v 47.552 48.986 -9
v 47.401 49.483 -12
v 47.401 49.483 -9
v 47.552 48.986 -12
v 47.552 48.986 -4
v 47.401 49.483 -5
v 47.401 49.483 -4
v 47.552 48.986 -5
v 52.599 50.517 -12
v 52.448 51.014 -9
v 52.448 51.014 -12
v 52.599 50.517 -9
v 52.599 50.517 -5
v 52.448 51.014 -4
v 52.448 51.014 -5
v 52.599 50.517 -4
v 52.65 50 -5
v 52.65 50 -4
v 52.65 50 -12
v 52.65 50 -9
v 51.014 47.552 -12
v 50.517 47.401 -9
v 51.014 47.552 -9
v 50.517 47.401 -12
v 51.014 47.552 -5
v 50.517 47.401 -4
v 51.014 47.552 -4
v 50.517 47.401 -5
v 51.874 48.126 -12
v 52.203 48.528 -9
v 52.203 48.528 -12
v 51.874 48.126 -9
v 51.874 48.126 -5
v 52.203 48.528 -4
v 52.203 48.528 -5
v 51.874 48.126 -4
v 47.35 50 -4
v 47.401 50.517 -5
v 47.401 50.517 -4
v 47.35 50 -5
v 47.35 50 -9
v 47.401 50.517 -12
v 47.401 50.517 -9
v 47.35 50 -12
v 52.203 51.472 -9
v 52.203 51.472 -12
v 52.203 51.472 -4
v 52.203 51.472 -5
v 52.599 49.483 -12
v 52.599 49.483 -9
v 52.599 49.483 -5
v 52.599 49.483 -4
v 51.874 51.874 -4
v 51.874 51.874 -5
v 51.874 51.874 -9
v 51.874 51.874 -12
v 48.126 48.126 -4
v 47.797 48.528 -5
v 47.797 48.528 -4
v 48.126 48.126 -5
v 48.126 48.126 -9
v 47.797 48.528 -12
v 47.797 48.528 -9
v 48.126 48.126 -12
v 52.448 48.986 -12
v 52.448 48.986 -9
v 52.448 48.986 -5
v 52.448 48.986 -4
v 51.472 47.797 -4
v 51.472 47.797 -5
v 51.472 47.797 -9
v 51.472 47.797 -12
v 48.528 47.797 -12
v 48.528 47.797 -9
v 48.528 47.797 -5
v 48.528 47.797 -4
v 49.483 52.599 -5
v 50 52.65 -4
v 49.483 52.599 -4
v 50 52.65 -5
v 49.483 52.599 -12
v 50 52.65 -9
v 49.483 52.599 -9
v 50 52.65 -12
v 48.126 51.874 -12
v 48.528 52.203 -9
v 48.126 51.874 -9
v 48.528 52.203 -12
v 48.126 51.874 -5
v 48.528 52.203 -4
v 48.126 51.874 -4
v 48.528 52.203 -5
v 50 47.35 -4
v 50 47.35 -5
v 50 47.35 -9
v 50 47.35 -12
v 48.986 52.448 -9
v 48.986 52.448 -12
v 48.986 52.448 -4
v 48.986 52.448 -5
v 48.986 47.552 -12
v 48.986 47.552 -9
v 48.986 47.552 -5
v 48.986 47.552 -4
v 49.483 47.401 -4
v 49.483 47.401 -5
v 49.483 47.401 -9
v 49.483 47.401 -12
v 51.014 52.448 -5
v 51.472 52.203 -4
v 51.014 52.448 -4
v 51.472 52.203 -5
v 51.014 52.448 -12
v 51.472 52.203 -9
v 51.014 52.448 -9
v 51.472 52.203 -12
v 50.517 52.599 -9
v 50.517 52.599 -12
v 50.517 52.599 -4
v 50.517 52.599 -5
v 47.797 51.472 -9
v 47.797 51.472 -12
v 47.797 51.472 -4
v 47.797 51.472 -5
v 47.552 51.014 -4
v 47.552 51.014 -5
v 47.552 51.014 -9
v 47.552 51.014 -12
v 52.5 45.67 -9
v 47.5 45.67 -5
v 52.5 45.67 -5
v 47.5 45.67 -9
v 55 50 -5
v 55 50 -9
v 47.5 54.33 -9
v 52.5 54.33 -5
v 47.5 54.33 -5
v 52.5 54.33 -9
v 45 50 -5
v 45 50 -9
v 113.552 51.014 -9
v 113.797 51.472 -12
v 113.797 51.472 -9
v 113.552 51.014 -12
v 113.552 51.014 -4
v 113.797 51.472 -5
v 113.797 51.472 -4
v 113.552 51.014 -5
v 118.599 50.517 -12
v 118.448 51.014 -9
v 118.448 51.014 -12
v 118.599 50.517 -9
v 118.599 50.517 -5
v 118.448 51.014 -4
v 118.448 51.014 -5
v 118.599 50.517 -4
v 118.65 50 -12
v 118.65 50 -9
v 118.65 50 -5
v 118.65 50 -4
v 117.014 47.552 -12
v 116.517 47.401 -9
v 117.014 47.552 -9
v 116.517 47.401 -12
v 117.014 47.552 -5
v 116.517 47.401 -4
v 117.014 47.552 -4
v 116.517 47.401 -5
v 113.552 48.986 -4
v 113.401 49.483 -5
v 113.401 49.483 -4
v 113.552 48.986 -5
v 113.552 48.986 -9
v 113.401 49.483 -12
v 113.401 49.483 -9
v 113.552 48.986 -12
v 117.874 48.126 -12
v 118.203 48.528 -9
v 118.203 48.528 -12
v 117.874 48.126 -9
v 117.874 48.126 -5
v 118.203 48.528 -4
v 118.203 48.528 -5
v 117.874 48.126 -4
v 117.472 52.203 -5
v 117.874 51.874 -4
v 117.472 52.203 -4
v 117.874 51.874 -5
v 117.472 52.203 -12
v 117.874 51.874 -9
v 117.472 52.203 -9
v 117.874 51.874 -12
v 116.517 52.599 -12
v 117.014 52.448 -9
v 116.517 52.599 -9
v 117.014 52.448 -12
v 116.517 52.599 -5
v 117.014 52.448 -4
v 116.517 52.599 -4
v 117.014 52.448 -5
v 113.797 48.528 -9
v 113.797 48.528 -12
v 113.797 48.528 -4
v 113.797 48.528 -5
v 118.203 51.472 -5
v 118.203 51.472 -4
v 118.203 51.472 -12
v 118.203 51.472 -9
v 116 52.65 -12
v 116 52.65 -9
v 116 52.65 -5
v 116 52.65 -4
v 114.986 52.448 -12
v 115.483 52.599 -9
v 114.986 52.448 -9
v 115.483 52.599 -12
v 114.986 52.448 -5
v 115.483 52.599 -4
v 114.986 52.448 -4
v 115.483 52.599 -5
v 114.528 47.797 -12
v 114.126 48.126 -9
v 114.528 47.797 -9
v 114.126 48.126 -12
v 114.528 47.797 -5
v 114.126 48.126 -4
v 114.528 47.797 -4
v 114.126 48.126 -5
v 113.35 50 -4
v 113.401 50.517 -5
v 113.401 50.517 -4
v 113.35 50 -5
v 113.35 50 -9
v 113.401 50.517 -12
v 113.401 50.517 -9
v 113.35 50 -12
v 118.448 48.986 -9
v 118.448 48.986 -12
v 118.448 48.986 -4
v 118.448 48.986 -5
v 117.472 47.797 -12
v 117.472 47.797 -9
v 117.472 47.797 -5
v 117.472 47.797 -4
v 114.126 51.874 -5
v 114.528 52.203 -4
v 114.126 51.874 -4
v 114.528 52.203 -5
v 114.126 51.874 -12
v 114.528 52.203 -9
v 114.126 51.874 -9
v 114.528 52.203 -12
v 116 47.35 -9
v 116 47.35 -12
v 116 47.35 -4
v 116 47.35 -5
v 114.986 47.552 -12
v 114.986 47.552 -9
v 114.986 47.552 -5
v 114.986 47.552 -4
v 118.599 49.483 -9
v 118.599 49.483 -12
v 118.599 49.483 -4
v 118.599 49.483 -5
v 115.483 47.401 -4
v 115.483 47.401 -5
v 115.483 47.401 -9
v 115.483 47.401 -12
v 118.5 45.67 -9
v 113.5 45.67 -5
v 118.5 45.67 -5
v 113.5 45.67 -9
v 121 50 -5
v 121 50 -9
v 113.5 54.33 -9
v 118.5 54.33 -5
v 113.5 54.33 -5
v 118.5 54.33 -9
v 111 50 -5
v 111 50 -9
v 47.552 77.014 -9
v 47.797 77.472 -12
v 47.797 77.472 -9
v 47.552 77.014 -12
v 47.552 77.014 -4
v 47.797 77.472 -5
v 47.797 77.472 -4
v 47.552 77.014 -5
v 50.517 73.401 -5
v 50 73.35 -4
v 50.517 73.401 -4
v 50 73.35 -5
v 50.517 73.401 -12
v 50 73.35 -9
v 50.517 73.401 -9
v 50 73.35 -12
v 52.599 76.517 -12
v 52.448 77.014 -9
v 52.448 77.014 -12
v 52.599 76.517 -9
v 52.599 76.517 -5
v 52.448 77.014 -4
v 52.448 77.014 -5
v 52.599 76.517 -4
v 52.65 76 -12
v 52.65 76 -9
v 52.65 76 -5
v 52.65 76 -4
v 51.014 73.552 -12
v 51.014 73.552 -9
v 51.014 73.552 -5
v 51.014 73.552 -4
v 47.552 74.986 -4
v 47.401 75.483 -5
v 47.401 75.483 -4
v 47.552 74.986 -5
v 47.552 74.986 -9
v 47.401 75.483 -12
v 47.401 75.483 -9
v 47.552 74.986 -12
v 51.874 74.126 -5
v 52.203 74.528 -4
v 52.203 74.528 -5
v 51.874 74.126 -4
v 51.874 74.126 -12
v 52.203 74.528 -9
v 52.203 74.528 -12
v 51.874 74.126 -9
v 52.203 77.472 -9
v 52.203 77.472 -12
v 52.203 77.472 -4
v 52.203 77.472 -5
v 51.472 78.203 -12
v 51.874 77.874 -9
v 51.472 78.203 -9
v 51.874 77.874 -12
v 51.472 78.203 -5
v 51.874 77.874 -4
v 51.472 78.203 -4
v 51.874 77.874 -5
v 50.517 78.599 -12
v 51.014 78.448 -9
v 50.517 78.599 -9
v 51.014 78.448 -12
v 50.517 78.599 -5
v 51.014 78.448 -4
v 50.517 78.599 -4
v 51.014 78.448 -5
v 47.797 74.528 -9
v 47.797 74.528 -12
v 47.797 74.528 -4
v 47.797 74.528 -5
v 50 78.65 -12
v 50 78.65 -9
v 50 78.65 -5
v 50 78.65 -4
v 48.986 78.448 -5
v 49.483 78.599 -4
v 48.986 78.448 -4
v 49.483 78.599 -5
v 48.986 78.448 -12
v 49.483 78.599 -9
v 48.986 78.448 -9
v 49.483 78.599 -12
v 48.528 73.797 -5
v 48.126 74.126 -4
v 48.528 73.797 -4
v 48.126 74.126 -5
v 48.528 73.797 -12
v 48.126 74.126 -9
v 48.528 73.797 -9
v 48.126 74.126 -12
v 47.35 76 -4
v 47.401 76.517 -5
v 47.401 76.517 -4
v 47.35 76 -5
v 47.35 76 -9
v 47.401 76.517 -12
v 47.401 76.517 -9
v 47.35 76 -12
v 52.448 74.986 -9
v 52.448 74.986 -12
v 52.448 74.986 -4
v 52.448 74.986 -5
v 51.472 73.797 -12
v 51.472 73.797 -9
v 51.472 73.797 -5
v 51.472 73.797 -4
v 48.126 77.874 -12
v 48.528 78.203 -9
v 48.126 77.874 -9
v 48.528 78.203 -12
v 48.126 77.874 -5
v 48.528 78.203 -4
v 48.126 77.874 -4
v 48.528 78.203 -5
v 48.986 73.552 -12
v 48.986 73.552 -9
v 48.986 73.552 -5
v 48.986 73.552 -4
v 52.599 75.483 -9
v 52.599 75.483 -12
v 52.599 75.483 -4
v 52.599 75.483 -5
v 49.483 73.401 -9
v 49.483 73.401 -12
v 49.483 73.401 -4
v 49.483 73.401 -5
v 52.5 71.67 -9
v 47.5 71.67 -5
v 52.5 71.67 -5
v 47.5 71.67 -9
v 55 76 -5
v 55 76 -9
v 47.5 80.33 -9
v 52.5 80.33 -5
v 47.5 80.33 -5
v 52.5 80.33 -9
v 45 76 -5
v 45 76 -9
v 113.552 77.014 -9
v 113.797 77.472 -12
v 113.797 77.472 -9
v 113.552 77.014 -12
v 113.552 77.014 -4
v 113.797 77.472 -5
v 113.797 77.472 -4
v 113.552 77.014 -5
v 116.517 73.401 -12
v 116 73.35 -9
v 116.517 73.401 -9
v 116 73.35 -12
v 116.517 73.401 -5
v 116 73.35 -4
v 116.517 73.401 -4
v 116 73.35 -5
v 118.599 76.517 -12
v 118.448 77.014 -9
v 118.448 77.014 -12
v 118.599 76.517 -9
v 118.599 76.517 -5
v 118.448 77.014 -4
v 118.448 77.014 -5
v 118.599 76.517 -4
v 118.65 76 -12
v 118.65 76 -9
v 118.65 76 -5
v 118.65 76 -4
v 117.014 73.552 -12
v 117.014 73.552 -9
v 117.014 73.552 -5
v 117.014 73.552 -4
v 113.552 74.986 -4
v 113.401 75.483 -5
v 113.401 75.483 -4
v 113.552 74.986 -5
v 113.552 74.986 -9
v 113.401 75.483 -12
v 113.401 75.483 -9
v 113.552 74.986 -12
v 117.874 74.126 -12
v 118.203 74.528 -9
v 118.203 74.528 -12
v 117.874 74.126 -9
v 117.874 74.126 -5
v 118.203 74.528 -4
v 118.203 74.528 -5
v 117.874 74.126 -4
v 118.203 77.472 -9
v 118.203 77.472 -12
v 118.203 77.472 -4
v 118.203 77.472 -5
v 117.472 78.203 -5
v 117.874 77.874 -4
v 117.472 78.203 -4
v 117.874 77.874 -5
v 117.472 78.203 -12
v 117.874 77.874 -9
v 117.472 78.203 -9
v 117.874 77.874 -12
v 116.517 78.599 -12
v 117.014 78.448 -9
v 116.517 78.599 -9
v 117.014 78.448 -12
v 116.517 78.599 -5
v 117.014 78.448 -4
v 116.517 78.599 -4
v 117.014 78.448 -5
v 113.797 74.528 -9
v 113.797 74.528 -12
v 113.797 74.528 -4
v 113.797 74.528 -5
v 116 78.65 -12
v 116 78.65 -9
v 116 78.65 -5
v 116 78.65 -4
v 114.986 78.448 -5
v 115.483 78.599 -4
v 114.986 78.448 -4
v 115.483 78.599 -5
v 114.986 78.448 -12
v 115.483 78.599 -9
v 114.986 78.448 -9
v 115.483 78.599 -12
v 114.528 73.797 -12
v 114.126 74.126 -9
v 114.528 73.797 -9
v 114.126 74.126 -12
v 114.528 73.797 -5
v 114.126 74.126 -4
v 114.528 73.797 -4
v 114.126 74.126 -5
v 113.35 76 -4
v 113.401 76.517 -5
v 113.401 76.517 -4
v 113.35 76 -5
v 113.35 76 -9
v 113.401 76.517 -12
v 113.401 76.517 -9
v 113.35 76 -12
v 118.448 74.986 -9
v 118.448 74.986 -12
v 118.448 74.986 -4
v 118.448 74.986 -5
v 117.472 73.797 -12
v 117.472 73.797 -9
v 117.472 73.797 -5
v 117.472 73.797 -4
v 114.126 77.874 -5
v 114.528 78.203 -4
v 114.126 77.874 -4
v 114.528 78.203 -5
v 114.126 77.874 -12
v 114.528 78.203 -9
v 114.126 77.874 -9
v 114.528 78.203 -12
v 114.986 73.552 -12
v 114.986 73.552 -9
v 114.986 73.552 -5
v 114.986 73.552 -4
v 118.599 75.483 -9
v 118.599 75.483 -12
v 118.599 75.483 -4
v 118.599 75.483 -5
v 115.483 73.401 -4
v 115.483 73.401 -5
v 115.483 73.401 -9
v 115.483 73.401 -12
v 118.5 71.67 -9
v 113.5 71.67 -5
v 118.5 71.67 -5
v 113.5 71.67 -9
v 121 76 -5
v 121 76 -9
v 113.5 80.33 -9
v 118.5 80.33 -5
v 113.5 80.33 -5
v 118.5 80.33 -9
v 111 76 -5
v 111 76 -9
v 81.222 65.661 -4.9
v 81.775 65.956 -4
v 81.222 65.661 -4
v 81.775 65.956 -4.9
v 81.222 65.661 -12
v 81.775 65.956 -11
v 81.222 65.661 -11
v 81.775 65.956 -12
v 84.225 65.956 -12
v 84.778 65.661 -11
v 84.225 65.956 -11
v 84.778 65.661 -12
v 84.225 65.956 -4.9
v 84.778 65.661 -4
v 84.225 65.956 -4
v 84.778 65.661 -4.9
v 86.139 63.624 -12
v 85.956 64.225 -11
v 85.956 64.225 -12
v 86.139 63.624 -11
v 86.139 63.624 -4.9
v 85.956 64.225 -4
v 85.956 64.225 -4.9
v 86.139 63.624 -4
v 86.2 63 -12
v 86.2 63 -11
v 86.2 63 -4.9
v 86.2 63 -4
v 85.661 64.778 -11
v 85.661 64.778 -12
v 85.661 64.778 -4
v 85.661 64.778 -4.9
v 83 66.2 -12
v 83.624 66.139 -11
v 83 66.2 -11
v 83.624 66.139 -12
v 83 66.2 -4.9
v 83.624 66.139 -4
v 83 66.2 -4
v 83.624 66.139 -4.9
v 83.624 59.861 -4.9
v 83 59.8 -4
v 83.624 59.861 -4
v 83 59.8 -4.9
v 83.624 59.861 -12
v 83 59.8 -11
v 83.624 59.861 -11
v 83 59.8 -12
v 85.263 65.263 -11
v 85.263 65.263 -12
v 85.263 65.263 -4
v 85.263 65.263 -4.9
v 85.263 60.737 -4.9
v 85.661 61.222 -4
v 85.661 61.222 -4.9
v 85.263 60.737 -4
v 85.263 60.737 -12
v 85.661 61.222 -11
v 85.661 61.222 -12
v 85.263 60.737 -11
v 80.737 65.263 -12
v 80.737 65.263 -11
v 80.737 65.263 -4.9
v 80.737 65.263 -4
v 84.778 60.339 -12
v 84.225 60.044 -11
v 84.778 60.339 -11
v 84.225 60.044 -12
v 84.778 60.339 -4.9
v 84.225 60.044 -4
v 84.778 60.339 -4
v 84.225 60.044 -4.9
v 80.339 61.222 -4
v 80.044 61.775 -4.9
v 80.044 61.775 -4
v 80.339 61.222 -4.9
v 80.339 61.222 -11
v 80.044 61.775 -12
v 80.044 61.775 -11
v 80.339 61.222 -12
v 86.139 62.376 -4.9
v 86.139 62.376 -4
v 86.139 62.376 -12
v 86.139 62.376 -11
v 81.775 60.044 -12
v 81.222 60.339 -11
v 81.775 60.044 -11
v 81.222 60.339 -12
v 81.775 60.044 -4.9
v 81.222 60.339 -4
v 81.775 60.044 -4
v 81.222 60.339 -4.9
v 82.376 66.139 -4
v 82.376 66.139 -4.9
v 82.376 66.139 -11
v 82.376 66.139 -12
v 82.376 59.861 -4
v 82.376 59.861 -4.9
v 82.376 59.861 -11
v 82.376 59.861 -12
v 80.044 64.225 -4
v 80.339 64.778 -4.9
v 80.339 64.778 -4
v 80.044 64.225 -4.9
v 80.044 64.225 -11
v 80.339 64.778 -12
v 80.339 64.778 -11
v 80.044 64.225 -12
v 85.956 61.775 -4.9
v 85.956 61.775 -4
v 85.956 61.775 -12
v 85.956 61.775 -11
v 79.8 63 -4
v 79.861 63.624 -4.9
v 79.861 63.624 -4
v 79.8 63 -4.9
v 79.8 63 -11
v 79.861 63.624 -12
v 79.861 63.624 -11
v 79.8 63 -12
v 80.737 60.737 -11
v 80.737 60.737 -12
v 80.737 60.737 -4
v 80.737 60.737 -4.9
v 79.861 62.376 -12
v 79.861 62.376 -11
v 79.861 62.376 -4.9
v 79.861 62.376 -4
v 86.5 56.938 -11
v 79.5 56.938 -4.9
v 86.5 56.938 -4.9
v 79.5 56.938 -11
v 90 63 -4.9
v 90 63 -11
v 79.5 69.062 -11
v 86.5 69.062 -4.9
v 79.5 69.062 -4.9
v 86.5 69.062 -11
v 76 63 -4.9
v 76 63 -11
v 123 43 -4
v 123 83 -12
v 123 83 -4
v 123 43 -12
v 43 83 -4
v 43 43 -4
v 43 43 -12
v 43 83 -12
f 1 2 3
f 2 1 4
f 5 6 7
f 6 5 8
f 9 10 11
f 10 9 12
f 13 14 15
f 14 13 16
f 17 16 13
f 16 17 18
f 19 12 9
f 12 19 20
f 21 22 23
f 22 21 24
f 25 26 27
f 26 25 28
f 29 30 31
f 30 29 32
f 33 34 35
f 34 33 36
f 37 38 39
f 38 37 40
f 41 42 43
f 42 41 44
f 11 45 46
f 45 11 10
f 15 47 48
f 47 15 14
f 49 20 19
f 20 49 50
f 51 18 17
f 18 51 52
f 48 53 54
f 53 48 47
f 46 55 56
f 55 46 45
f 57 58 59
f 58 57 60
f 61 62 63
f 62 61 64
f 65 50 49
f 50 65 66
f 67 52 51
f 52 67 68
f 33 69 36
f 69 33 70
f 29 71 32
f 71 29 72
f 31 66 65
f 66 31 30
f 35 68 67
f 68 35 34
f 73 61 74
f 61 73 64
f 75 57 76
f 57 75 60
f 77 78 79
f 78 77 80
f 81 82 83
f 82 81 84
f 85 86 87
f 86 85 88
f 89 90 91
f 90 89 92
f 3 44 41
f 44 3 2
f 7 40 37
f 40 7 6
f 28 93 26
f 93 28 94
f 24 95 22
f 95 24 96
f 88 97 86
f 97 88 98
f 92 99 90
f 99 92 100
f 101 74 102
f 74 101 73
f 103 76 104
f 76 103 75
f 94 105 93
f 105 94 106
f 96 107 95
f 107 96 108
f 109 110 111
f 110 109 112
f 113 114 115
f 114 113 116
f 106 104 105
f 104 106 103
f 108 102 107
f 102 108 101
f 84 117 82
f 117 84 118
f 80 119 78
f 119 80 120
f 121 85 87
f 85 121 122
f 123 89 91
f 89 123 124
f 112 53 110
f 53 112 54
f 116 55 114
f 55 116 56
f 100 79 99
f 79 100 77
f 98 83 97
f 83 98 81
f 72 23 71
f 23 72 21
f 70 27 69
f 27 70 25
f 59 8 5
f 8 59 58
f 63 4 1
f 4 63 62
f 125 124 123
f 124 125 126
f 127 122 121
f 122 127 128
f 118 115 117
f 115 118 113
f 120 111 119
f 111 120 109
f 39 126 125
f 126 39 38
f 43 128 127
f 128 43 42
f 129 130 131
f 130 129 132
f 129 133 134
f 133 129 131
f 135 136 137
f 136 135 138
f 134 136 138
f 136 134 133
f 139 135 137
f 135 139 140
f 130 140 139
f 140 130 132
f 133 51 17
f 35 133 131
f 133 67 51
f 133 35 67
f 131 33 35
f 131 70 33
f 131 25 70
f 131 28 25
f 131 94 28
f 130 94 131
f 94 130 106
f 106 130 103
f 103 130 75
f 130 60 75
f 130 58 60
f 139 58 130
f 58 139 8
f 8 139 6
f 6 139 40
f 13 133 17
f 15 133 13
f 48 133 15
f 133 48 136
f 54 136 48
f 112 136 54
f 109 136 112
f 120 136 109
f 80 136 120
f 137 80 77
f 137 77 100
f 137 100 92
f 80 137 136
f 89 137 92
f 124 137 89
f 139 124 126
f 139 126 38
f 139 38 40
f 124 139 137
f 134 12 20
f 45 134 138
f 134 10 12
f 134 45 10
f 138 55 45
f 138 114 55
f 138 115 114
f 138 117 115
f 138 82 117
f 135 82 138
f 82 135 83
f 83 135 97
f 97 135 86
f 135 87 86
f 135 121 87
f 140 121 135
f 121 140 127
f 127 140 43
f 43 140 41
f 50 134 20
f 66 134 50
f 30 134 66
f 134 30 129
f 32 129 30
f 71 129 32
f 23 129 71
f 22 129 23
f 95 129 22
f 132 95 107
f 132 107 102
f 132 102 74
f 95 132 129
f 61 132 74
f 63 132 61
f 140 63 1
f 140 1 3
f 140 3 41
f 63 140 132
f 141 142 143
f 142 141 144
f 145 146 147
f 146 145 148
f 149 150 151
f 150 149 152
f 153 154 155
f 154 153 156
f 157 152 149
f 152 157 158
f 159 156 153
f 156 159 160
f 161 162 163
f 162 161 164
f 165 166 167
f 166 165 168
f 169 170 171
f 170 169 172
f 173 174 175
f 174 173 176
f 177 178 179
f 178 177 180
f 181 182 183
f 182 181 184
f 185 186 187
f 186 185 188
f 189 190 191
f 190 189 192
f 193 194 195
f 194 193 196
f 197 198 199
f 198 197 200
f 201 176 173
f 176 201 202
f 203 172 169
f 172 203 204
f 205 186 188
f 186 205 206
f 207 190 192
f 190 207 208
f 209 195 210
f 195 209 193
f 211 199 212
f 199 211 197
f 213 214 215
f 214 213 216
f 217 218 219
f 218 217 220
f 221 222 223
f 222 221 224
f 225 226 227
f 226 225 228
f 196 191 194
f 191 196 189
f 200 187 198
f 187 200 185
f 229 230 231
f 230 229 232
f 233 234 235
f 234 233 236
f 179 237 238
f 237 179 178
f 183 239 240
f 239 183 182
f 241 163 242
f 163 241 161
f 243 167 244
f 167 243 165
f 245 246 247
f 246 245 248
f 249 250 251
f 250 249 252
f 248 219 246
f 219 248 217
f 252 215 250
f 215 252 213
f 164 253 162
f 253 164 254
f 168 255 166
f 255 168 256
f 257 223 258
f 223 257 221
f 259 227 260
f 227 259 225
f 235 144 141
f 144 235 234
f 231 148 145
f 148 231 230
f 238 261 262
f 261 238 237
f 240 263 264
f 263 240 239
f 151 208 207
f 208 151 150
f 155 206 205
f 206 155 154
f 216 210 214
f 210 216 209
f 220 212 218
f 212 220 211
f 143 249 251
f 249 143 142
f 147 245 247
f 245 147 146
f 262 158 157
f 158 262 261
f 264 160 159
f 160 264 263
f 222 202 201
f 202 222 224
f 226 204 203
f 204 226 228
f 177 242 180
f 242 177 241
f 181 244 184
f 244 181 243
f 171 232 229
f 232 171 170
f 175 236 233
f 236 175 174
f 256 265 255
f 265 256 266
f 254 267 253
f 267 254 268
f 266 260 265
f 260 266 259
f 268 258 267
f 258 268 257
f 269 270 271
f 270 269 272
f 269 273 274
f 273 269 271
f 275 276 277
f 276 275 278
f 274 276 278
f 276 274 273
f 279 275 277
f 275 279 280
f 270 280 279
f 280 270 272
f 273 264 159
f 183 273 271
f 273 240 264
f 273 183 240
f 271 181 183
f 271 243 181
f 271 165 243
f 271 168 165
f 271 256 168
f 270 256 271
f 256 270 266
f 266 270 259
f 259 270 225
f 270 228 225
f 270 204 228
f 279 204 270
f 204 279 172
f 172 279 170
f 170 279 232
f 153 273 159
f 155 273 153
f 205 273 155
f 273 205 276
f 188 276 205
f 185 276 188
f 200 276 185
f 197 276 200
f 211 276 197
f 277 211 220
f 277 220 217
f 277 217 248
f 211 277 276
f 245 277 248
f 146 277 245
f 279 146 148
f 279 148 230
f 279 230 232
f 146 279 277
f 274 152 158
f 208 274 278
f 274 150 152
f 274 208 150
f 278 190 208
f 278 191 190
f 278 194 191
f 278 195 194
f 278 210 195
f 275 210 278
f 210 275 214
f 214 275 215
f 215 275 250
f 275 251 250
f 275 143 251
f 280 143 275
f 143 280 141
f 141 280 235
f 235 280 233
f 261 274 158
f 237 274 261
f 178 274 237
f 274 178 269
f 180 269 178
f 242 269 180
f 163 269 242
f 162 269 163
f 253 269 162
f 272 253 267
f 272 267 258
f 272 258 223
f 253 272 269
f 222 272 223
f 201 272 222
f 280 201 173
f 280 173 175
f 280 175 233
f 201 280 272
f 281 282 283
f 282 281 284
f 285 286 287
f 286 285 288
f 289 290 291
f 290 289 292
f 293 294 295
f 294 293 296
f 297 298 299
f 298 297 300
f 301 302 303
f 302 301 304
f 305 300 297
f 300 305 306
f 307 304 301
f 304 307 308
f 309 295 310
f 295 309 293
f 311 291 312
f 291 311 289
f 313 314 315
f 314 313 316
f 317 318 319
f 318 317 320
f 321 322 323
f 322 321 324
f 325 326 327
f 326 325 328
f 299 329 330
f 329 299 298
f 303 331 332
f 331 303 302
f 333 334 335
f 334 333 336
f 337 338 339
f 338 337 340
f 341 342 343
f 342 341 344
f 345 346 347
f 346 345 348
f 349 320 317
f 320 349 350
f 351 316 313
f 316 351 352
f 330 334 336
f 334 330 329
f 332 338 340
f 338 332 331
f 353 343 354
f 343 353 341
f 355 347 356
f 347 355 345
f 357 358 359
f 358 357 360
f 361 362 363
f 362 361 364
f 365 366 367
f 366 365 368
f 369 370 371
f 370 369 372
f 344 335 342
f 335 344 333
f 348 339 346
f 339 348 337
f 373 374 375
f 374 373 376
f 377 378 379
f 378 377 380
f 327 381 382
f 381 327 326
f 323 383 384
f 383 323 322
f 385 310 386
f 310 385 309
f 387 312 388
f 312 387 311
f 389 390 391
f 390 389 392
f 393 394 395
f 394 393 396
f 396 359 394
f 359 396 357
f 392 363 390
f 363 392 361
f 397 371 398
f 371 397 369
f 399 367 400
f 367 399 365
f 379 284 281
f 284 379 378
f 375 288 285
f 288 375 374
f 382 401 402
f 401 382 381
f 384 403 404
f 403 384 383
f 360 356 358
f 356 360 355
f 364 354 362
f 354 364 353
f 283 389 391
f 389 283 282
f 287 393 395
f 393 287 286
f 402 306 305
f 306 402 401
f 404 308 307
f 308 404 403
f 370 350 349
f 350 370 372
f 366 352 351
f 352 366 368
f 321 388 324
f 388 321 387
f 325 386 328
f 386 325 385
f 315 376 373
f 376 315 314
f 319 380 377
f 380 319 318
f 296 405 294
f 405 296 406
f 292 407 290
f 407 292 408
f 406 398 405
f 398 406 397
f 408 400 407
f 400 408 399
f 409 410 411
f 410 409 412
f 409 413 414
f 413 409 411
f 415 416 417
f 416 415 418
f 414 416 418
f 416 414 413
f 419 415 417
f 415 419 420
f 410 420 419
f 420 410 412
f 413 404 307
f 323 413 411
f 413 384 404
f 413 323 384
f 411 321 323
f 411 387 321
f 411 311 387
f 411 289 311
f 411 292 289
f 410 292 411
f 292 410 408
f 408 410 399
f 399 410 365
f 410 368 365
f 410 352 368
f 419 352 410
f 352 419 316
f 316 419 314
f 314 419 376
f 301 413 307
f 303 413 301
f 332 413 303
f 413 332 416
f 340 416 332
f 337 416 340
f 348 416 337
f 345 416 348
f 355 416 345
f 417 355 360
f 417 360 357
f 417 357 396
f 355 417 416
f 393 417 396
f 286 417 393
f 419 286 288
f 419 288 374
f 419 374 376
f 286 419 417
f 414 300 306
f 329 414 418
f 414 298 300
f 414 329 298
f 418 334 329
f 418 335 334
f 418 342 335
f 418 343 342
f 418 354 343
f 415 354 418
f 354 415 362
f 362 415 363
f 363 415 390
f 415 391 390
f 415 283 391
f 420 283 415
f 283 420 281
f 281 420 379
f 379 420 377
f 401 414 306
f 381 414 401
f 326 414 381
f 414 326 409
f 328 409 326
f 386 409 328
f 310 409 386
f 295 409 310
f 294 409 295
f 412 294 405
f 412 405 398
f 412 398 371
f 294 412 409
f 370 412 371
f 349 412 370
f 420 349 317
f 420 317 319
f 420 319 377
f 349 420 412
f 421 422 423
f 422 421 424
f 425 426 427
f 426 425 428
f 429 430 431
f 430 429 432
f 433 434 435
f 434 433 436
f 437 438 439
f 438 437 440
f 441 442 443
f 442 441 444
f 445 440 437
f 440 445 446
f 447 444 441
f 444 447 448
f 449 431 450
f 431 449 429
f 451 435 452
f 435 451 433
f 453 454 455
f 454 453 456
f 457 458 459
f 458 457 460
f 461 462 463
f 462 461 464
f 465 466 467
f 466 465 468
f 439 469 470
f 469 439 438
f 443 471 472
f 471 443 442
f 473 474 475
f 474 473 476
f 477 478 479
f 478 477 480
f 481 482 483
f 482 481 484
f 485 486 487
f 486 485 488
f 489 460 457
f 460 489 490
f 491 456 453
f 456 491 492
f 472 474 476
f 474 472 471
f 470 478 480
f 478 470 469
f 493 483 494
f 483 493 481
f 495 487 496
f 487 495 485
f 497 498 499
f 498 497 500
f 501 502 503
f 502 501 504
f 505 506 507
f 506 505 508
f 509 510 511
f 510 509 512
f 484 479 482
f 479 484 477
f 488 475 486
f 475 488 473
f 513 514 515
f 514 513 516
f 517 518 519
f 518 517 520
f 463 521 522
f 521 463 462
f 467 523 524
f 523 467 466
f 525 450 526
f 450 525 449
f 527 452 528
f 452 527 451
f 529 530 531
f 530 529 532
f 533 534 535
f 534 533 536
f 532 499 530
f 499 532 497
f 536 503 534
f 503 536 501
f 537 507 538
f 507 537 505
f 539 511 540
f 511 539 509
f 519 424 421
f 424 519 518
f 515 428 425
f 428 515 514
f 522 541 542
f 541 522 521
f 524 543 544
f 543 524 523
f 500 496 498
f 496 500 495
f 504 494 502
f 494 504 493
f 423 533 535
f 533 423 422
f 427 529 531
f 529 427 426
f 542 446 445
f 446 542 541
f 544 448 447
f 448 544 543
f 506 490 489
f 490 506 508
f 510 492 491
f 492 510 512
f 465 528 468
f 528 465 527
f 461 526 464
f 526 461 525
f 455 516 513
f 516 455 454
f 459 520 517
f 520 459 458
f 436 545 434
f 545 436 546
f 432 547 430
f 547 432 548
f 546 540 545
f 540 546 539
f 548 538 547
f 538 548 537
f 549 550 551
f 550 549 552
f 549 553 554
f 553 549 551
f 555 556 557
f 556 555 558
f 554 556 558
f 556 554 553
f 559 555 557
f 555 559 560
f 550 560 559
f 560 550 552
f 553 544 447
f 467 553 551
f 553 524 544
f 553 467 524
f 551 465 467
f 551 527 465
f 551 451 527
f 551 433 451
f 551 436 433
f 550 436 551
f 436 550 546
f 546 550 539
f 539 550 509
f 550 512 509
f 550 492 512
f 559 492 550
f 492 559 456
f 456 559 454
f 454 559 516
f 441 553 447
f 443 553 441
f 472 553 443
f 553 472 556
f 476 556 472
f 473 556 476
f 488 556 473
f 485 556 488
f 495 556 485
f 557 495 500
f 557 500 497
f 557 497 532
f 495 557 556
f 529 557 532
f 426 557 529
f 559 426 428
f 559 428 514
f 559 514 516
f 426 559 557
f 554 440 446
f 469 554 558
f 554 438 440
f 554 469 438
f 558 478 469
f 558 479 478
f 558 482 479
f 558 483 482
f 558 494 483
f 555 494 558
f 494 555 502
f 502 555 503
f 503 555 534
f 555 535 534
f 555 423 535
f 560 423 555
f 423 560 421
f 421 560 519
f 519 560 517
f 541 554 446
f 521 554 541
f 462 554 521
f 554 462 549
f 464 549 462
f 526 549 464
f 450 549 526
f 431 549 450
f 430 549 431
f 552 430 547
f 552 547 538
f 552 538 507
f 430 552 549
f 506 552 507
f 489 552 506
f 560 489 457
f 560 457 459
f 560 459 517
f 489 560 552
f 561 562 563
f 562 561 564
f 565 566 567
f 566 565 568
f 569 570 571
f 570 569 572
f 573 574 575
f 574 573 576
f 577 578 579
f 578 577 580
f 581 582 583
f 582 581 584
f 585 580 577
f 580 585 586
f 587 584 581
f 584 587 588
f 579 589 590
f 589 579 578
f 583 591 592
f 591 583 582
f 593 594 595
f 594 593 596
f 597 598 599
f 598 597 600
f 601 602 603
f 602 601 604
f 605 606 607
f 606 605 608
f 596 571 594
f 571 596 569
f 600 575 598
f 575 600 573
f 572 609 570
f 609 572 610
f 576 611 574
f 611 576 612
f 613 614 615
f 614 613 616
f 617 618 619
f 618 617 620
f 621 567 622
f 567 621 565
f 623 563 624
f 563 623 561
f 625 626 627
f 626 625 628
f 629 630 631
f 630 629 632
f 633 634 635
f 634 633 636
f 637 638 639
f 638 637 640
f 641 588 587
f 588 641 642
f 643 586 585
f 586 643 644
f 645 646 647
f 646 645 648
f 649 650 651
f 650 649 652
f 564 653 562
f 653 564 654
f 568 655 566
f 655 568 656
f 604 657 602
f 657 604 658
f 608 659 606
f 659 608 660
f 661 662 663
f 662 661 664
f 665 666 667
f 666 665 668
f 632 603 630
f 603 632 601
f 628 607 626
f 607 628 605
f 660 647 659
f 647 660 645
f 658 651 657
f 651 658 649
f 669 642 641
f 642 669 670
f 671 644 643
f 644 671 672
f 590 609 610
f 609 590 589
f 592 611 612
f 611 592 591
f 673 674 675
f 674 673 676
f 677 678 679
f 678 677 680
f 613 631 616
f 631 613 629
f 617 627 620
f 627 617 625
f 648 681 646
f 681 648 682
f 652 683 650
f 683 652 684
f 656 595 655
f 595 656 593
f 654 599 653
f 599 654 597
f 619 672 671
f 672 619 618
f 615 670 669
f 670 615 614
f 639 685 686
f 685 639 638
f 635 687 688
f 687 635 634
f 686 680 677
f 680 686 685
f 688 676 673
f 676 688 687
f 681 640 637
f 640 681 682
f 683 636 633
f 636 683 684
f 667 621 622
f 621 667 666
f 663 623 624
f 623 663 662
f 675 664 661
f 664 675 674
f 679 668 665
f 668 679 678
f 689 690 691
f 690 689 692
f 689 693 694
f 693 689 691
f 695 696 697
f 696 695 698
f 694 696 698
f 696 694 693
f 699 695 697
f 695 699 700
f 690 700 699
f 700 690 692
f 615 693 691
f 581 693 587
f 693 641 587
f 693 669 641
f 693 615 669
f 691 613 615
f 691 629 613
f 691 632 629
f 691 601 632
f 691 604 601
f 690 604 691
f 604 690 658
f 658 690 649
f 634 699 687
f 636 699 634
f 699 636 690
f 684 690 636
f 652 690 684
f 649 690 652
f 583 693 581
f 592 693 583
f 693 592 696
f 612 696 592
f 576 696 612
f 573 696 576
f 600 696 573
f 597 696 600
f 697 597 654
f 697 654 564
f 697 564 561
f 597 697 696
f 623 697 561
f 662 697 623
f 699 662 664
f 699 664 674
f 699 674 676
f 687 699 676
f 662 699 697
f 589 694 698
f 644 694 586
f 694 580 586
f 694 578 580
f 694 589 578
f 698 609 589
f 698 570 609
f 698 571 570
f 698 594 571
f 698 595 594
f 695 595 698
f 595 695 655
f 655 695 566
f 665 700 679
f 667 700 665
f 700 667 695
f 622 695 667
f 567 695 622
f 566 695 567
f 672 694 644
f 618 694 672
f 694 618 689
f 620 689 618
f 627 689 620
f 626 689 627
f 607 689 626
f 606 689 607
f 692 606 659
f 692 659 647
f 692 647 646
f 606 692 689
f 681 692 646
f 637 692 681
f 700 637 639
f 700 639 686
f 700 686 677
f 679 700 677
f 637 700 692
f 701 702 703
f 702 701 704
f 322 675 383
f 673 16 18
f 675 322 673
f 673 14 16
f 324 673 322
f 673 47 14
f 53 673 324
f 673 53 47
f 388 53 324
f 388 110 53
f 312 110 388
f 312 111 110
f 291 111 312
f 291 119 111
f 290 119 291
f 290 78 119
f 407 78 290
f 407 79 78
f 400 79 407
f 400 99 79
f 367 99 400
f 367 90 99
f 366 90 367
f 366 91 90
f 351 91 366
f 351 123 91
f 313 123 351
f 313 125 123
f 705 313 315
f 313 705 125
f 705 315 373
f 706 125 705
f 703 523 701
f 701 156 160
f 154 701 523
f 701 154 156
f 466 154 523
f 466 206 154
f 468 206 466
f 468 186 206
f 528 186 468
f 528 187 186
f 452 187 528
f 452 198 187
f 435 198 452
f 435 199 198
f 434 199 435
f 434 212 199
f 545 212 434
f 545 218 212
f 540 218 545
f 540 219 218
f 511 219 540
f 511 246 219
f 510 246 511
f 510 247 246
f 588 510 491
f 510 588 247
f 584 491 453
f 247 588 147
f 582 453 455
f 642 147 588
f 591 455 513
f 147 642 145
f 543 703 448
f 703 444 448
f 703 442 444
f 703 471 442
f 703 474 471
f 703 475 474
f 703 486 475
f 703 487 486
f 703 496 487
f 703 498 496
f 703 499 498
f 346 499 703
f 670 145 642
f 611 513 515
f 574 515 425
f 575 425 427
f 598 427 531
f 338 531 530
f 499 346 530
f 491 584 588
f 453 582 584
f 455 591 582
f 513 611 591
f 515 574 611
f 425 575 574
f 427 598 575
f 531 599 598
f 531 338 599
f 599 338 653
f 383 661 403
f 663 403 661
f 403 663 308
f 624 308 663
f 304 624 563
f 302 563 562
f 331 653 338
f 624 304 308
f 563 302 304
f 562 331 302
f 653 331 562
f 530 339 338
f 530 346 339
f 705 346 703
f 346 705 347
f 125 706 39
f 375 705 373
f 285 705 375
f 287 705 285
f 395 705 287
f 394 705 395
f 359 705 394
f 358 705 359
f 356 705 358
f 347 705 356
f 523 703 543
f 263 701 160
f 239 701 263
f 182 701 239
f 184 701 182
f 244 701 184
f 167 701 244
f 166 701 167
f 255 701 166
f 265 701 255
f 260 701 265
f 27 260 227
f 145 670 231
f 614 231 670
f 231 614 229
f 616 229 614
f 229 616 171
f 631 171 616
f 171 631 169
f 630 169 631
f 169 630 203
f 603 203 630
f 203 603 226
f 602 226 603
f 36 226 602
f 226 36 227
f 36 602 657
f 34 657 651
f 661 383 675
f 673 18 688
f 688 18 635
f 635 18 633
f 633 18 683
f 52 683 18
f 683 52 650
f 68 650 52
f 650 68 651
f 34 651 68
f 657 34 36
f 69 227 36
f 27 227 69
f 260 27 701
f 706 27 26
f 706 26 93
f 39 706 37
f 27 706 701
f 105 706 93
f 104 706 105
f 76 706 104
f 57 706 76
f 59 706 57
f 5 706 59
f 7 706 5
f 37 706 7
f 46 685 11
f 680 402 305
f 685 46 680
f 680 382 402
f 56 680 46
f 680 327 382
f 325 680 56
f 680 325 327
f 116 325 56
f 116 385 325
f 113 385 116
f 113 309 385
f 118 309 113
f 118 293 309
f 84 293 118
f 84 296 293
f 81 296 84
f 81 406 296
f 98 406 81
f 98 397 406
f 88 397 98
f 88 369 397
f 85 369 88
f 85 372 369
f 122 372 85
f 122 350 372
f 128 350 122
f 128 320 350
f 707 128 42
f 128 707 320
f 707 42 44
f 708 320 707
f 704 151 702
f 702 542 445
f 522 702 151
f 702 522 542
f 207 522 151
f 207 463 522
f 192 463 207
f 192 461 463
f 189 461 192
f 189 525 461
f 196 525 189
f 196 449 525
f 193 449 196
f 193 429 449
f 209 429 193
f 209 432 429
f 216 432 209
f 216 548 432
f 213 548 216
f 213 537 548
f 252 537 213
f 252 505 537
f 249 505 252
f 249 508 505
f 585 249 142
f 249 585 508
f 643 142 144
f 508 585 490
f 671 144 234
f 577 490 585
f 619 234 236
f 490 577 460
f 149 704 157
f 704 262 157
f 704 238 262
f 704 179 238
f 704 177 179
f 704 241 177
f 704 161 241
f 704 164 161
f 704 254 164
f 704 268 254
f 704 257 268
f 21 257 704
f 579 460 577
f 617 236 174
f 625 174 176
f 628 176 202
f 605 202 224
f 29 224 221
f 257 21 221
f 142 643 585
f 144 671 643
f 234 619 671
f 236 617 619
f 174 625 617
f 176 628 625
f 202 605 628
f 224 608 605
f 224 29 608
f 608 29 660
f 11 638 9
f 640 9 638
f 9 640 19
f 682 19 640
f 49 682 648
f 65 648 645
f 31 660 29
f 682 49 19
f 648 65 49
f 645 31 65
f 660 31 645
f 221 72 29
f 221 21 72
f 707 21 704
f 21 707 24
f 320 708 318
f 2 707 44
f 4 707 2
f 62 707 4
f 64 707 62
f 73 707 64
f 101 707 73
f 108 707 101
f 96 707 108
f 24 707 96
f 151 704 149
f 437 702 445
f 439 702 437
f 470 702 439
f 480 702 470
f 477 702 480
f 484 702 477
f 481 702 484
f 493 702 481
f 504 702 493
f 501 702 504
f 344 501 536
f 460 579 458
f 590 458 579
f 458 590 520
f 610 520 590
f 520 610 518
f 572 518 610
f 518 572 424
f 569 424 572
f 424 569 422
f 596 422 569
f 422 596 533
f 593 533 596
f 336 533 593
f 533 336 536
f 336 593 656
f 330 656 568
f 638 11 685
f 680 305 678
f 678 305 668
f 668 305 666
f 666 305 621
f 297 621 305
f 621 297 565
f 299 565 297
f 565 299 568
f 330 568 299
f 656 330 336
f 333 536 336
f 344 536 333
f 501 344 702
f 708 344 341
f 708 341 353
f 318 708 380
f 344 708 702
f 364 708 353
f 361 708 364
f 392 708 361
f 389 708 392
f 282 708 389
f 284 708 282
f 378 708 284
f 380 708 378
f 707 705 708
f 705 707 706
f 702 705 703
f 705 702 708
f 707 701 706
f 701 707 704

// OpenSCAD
// file: enclosure_util.scad
module threadhole(  screw_hole_diameter = 6.5, 
                    socket_diameter     = 24,
                    socket_height       = 8,
                    length              = 22,
                    height              = 18) {
                        
    // 1/4 inch = 0,635cm

    cube([screw_hole_diameter, length, height]);
    
    translate([screw_hole_diameter/2, 0, 0]) cylinder(h=height, d=screw_hole_diameter, $fn=64);
    translate([screw_hole_diameter/2, length, 0]) cylinder(h=height, d=screw_hole_diameter, $fn=64);
    translate([-(socket_diameter/2 - screw_hole_diameter/2), 0, 0]) cube([socket_diameter, length, socket_height]);
    translate([screw_hole_diameter/2, 0, 0]) cylinder(h=socket_height, d=socket_diameter, $fn=128);
    translate([screw_hole_diameter/2, length, 0]) cylinder(h=socket_height, d=socket_diameter, $fn=128);
}

module triangle(width, height) {
   
    // a^2 = c^2
    // a = sqrt ( c^2 / 2 )
                
    a = sqrt(pow(height, 2) / 2);
                
    translate([0, 0, -a]) {
        intersection() {
            rotate([45, 0, 0]) cube([width, height, height]);
            translate([0, -a, a]) cube([width, a, a]);
        }
    } 
}   
// file: camera.scad
module camera() {

    translate([0, -17, 0]) {
        cube([40, 17, 67]);
    }
    translate([88, 27, 51]) {
        cube([36, 10, 20]);
    }

    // tripod screw thread
    difference() {
        cube([120, 27, 67]); // <--
        translate([78, 15, -1]) {
            cylinder(h = 5, d = 8);
        }
    }
    translate([78, 15, 3]) {
        color([1, 0, 0]) cylinder(h = 1, d = 8);
    }
    
    // knobs
    translate([20, 15, 67]) {
        cylinder(h = 1.5, d = 14);
    }
    translate([40, 15, 67]) {
        cylinder(h = 1.5, d = 14);
    }
    
    // belt attachment holder
    translate([-6, 20, 54]) {
        cube([6, 1, 6]);
    }
    translate([120, 20, 54]) {
        cube([6, 1, 6]);
    }

    // lens mount and lens
    translate([78, 0, 32]) {
        rotate([90]) {
            color([1,0,0]) cylinder(h = 5, d = 60);
            
            // lens
            translate([0, 0, 5]) {
            cylinder(h = 23, d = 62);
            }
        }
    }
    
    // port door
    translate([120, 8, 9]) cube([9, 1, 27]);
}
// main file
include <camera.scad>;
include <enclosure_util.scad>;

size_top    = [165, 98, 0.1];
size_bottom = [157, 91, 0.1];
height      = 47;
nose_depth  = 66;

translation_x = (size_top[0]-size_bottom[0])/2;
translation_y = (size_top[1]-size_bottom[1])/2;    

radius_b = 6;
radius_t = 10;

corner_radius       = 2.5;

wall_thickness      = 2.4;
bottom_thickness    = 1.2;

render_simplified   = true;
clamp_print         = false;
mat_saving_holes    = true;

// ---
/*
TODO:

Halterung für Batterie

*/

translate([size_top[0]/2 - 39.5, 43, -12]) socketplate();
//inset();

// translate([8, 27, 12]) camera();

module inset() {

    difference() {
        union() {
            difference() {
                translate([size_top[0], 0, 0]) rotate([90, 0, 180]) enclosure();
                
                // strap holder opening
                translate([0, 31, 64]) {
                    translate([-1, 6, 6]) rotate([0, 90, 0]) cylinder(h=10, d=12);
                    translate([-1, 6, 0]) cube([10, 15, 12]);
                }
            }

            // socket triangle
            translate([39, 10, 0]) {
                rotate([0, 0, 0]) triangle(88, 17);
            }

            // socket block
            translate([39, 10, 0]) {
                difference() {  
                    cube([88, 49, 12]);    
                    translate([-10, 45, 4]) {
                        rotate([0, 90, 0]) {
                            difference() {
                                cube([12, 12, 100]);
                                translate([0, 0, -10]) {
                                    cylinder(h = 120, d = 8, $fn=64); 
                                }
                            }
                        }
                    }
                }
            }
            
            // pressure noses            
            translate([size_top[0]/2 - 20/2, 0, size_top[1]-wall_thickness]) pressureNose();
            translate([size_top[0]- wall_thickness, 0, 40]) rotate([0, 90, 0]) pressureNose();
            translate([wall_thickness, 0, 40-20]) rotate([0, -90, 0]) pressureNose();
        
        }
        
        // negative outer shell
        translate([size_top[0], 0, 0]) rotate([90, 0, 180]) {
            difference() {
                translate([-20, -20, -20]) cube([size_top[0]+40, size_top[1]+40, height+20]);
                block(size_top, size_bottom, height);
            }
        }

        // threadhole
        translate([82, 28, -1]) {
            threadhole();
        }
        
        // screw tunnels
        tunnel_height = 2.8;
        translate([0, 0, -0.1]) intersection() {
            translate([size_top[0], 0, 0]) rotate([90, 0, 180]) difference() {
                block(size_top, size_bottom, height);
                translate([0, tunnel_height, 0]) block(size_top, size_bottom, height);
            }
            
            union() { 
                translate([43, 13, 0]) {
                    cube([12, 100, 10]);
                    translate([6, 0, 0])cylinder(h=10, d=12, $fn=32);
                }
                
                translate([111, 13, 0]) {
                    cube([12, 100, 10]);
                    translate([6, 0, 0]) cylinder(h=10, d=12, $fn=32);
                }    
            }
        }
        translate([43, 40, -0.01]) cube([12, 20, tunnel_height]);
        translate([111, 40, -0.01]) cube([12, 20, tunnel_height]);
    }

    // tripod test hole    
    // translate([87, 42, -1]) cylinder(h=10, d=10);
}

// ------------------------------------------------------------------

module pressureNose() {
    
    nose_width = 20;
    curvature  = 3;
    
    depth = nose_depth - 5;

    translate([0, 5, 0]) difference() {
        union() {           
            translate([nose_width/2, 0, -2]) {
                translate([0, 0, 4]) rotate([270, 0, 0]) scale([1, 0.5, 1]) cylinder(h=depth, d=nose_width, $fn=64);
                translate([0, depth-4+2, 2]) rotate([0, 180, 180]) prism(2,2,2);
                    
            }     
        } 
        difference() {
            offset = 0.85;
            
            translate([0, depth-curvature/2, offset]) cube([nose_width, 10, 10]);
            translate([0, depth-curvature/2, offset]) rotate([0, 90, 0]) cylinder(h=nose_width, d=curvature, $fn=32);
        }
  
        translate([0, depth-20, wall_thickness]) cube([nose_width, 20, 10]);
    }
    
}

// ------------------------------------------------------------------


module socketplate() { 
    
    // 1/4 Nut Height: 5.6  Width: 11.1
    // M5 Nut  Height: 3.2  Width: 8 
    
//    color("green") {
//        translate([3, 3.3, 10]) cube([8,8,2]);
//        translate([34, 14.7, 10]) cube([11.1,11.1,2]);
//    }
    
    union() {
    difference() {
        dist        = 7; // should be 6 actually
        nutM5       = 10; // ?
        nut14Inch   = 14; // ?

        cube([80, 40, 8]);
        
        translate([dist,    dist,       -1]) {
            cylinder(d=5.3, h=18, $fn=32);
            translate([0, 0, 4]) cylinder(d=nutM5, h=4, $fn=6); 
        }
        translate([80-dist, dist,       -1]) {
            cylinder(d=5.3, h=18, $fn=32);
            translate([0, 0, 4]) cylinder(d=nutM5, h=4, $fn=6); 
        }
        translate([dist,    40-dist,    -1]) {
            cylinder(d=5.3, h=18, $fn=32);
            translate([0, 0, 4]) cylinder(d=nutM5, h=4, $fn=6); 
        }
        translate([80-dist, 40-dist,    -1]) {
            cylinder(d=5.3, h=18, $fn=32);
            translate([0, 0, 4]) cylinder(d=nutM5, h=4, $fn=6); 
        }
        
//        translate([80/4, 40/2, -1]) {
//            cylinder(d=6.4, h=12, $fn=32);  
//            cylinder(d=nut14Inch, h=8, $fn=6);  
//        }
        translate([80/2, 40/2, -1]) {
            cylinder(d=6.4, h=12, $fn=32);  
            translate([0, 0, 2]) cylinder(d=nut14Inch, h=6.1, $fn=6); // h=6
        }
//        translate([(80/4)*3, 40/2, -1]) {
//            cylinder(d=6.4, h=12, $fn=32);  
//            translate([0, 0, 2]) cylinder(d=nut14Inch, h=6, $fn=6); 
//        }
            
        // test
        // translate([-1, -1, -1]) cube([7, 100, 30]);
    }
    
        // support layer to properly print hole
        //translate([0, 0, 3]) color([1,1,1,0.5]) cube([15, 15, 0.2]);
    }
}

// ------------------------------------------------------------------

module enclosure() {
    union() {
        difference() {
            if (!render_simplified) {
                block4(size_top, size_bottom, height, radius_b, radius_t);
            } else {
                block2(size_top, size_bottom, height, radius_b, radius_t);
            }
                    
            // lens
            translate([ size_top[0]/2,
                        size_top[1]/2,
                        -1]) {
                cylinder(h=10, d=80, $fn=64);
            }
            
            // material saving holes
            if (mat_saving_holes) {
                distance = 27;
                translate([ distance,
                            distance,
                            -1]) cylinder(h=10, d=30, $fn=32);
                
                translate([ distance,
                            size_top[1]-distance,
                            -1]) cylinder(h=10, d=30, $fn=32);
                
                translate([ size_top[0]-distance,
                            distance,
                            -1]) cylinder(h=10, d=30, $fn=32);
                
                translate([ size_top[0]-distance,
                            size_top[1]-distance,
                            -1]) cylinder(h=10, d=30, $fn=32);
            }
        }
    }
}

module block4() {
    difference() {
        block3(size_top, size_bottom, height, radius_b, radius_t);
        
        translate([translation_x-0.2, translation_y-0.2, 0])
        rotate([0, 0, 0]) cornercutter_sphere();
  
        translate([ size_bottom[0] + translation_x+0.2, 
                    translation_y-0.2, 0])
        rotate([0, 0, 90]) cornercutter_sphere();

        translate([ size_bottom[0] + translation_x+0.2, 
                    size_bottom[1] + translation_y+0.2, 0])
        rotate([0, 0, 180]) cornercutter_sphere();
    
        translate([ translation_x-0.2, 
                    size_bottom[1] + translation_y+0.2, 0])
        rotate([0, 0, 270]) cornercutter_sphere();
    }
    
}

module cornercutter_sphere() {

    difference() {
        cube([radius_b, radius_b, corner_radius]);
        translate([radius_b, radius_b, 0]) cylinder(h=corner_radius, d=radius_b+corner_radius*2, $fn=64);
    

        translate([radius_b, radius_b, corner_radius]) rotate([0, 0, 180])
        intersection() {
            translate([0, 0, -corner_radius])
            cube([radius_t, radius_t, 10]);
                rotate_extrude(convexity = 10, $fn = 64)
                    translate([radius_b-corner_radius, 0, 0])
                    circle(r = corner_radius, $fn = 64);
        }
    }
}


module block3(top, bottom, h, r1, r2) {    
    difference() {
        block2(top, bottom, h, r1, r2);
       
        translate([ 0,
                    translation_y-1,
                    -0.1])
        cornercutter(top[0], corner_radius*2);
    
        translate([ top[0],
                    top[1] - translation_y+1,
                    -0.1])
        rotate([0, 0, 180])
        cornercutter(top[0], corner_radius*2);
        
        translate([ top[0] - translation_x+1,
                    0,
                    -0.1])
        rotate([0, 0, 90])
        cornercutter(top[1], corner_radius*2);

        translate([ translation_x-1,
                    top[1],
                    -0.1])
        rotate([0, 0, 270])
        cornercutter(top[1], corner_radius*2);  
    }
   
}

module cornercutter(width, corner_radius) {
    translate([-0.01, -0.01, -0.01])
    difference() {
        translate([ 0,
                    0,
                    0])
        cube([width+0.02, corner_radius, corner_radius]);
      
        translate([ 0,
                    0 + corner_radius,
                    corner_radius]) 
        rotate([0, 90, 0]) 
        cylinder(h=width+0.02, d=corner_radius*2, $fn=32);
    }
    
}

module block2(top, bottom, h, r1, r2) {
    union() {
        difference() {
            block(top, bottom, h);
            
            translate([wall_thickness, wall_thickness, bottom_thickness]) block(
                        [size_top[0]-wall_thickness*2, size_top[1]-wall_thickness*2, 0.1],
                        [size_bottom[0]-wall_thickness*2, size_bottom[1]-wall_thickness*2, 0.1],
                        height+0.1
                    );
        }
        
        trans_x = (top[0] - bottom[0])/2;
        trans_y = (top[1] - bottom[1])/2;
        
        support_triangle_size = 3;
        translate([bottom[0] + trans_x, trans_y + wall_thickness, 1]) rotate([0, 0, 180]) triangle(size_bottom[0], support_triangle_size);
        translate([trans_x, trans_y + bottom[1] - wall_thickness, 1]) rotate([0, 0, 0]) triangle(size_bottom[0], support_triangle_size);
        translate([trans_x + wall_thickness, trans_y, 1]) rotate([0, 0, 90]) triangle(size_bottom[1], support_triangle_size);
        translate([trans_x + bottom[0] - wall_thickness, trans_y, 1]) rotate([270, 0, 90]) triangle(size_bottom[1], support_triangle_size);
    }
}

module cornercutter_vert(r, h) {    
    translate([0, 0, -0.01]) {
        difference() {
        cube([r, r, h+1]);
        translate([r, r, 0])
            cylinder(h=h+1, r=r, $fn=65);
        }
    }    
}

module block(top, bottom, h) {    
    hull() {
        translate([ (top[0]-bottom[0])/2, 
                    (top[1]-bottom[1])/2, 
                    0]) {
            
            difference() {
                cube(bottom);
                
                translate([0, 0, 0]) rotate([0, 0, 0]) cornercutter_vert(radius_b, 1);
                translate([bottom[0]+0.01, -0.01, 0]) rotate([0, 0, 90]) cornercutter_vert(radius_b, 1);
                translate([bottom[0]+0.01, bottom[1]+0.01, 0]) rotate([0, 0, 180]) cornercutter_vert(radius_b, 1);
                translate([-0.01, bottom[1]+0.01, 0]) rotate([0, 0, 270]) cornercutter_vert(radius_b, 1);
            }
        }
        translate([0, 0, h]) {
            difference() {
                cube(top);
                
                translate([0, 0, 0]) rotate([0, 0, 0]) cornercutter_vert(radius_t, 1);
                translate([top[0]+0.01, -0.01, 0]) rotate([0, 0, 90]) cornercutter_vert(radius_t, 1);
                translate([top[0]+0.01, top[1]+0.01, 0]) rotate([0, 0, 180]) cornercutter_vert(radius_t, 1);
                translate([-0.01, top[1]+0.01, 0]) rotate([0, 0, 270]) cornercutter_vert(radius_t, 1);
            }
        }
    }
}

module prism(l, w, h){
    polyhedron(points=[[0,0,0], [l,0,0], [l,w,0], [0,w,0], [0,w,h], [l,w,h]], faces=[[0,1,2,3],[5,4,3,2],[0,4,5,1],[0,3,4],[5,2,1]]);
}
